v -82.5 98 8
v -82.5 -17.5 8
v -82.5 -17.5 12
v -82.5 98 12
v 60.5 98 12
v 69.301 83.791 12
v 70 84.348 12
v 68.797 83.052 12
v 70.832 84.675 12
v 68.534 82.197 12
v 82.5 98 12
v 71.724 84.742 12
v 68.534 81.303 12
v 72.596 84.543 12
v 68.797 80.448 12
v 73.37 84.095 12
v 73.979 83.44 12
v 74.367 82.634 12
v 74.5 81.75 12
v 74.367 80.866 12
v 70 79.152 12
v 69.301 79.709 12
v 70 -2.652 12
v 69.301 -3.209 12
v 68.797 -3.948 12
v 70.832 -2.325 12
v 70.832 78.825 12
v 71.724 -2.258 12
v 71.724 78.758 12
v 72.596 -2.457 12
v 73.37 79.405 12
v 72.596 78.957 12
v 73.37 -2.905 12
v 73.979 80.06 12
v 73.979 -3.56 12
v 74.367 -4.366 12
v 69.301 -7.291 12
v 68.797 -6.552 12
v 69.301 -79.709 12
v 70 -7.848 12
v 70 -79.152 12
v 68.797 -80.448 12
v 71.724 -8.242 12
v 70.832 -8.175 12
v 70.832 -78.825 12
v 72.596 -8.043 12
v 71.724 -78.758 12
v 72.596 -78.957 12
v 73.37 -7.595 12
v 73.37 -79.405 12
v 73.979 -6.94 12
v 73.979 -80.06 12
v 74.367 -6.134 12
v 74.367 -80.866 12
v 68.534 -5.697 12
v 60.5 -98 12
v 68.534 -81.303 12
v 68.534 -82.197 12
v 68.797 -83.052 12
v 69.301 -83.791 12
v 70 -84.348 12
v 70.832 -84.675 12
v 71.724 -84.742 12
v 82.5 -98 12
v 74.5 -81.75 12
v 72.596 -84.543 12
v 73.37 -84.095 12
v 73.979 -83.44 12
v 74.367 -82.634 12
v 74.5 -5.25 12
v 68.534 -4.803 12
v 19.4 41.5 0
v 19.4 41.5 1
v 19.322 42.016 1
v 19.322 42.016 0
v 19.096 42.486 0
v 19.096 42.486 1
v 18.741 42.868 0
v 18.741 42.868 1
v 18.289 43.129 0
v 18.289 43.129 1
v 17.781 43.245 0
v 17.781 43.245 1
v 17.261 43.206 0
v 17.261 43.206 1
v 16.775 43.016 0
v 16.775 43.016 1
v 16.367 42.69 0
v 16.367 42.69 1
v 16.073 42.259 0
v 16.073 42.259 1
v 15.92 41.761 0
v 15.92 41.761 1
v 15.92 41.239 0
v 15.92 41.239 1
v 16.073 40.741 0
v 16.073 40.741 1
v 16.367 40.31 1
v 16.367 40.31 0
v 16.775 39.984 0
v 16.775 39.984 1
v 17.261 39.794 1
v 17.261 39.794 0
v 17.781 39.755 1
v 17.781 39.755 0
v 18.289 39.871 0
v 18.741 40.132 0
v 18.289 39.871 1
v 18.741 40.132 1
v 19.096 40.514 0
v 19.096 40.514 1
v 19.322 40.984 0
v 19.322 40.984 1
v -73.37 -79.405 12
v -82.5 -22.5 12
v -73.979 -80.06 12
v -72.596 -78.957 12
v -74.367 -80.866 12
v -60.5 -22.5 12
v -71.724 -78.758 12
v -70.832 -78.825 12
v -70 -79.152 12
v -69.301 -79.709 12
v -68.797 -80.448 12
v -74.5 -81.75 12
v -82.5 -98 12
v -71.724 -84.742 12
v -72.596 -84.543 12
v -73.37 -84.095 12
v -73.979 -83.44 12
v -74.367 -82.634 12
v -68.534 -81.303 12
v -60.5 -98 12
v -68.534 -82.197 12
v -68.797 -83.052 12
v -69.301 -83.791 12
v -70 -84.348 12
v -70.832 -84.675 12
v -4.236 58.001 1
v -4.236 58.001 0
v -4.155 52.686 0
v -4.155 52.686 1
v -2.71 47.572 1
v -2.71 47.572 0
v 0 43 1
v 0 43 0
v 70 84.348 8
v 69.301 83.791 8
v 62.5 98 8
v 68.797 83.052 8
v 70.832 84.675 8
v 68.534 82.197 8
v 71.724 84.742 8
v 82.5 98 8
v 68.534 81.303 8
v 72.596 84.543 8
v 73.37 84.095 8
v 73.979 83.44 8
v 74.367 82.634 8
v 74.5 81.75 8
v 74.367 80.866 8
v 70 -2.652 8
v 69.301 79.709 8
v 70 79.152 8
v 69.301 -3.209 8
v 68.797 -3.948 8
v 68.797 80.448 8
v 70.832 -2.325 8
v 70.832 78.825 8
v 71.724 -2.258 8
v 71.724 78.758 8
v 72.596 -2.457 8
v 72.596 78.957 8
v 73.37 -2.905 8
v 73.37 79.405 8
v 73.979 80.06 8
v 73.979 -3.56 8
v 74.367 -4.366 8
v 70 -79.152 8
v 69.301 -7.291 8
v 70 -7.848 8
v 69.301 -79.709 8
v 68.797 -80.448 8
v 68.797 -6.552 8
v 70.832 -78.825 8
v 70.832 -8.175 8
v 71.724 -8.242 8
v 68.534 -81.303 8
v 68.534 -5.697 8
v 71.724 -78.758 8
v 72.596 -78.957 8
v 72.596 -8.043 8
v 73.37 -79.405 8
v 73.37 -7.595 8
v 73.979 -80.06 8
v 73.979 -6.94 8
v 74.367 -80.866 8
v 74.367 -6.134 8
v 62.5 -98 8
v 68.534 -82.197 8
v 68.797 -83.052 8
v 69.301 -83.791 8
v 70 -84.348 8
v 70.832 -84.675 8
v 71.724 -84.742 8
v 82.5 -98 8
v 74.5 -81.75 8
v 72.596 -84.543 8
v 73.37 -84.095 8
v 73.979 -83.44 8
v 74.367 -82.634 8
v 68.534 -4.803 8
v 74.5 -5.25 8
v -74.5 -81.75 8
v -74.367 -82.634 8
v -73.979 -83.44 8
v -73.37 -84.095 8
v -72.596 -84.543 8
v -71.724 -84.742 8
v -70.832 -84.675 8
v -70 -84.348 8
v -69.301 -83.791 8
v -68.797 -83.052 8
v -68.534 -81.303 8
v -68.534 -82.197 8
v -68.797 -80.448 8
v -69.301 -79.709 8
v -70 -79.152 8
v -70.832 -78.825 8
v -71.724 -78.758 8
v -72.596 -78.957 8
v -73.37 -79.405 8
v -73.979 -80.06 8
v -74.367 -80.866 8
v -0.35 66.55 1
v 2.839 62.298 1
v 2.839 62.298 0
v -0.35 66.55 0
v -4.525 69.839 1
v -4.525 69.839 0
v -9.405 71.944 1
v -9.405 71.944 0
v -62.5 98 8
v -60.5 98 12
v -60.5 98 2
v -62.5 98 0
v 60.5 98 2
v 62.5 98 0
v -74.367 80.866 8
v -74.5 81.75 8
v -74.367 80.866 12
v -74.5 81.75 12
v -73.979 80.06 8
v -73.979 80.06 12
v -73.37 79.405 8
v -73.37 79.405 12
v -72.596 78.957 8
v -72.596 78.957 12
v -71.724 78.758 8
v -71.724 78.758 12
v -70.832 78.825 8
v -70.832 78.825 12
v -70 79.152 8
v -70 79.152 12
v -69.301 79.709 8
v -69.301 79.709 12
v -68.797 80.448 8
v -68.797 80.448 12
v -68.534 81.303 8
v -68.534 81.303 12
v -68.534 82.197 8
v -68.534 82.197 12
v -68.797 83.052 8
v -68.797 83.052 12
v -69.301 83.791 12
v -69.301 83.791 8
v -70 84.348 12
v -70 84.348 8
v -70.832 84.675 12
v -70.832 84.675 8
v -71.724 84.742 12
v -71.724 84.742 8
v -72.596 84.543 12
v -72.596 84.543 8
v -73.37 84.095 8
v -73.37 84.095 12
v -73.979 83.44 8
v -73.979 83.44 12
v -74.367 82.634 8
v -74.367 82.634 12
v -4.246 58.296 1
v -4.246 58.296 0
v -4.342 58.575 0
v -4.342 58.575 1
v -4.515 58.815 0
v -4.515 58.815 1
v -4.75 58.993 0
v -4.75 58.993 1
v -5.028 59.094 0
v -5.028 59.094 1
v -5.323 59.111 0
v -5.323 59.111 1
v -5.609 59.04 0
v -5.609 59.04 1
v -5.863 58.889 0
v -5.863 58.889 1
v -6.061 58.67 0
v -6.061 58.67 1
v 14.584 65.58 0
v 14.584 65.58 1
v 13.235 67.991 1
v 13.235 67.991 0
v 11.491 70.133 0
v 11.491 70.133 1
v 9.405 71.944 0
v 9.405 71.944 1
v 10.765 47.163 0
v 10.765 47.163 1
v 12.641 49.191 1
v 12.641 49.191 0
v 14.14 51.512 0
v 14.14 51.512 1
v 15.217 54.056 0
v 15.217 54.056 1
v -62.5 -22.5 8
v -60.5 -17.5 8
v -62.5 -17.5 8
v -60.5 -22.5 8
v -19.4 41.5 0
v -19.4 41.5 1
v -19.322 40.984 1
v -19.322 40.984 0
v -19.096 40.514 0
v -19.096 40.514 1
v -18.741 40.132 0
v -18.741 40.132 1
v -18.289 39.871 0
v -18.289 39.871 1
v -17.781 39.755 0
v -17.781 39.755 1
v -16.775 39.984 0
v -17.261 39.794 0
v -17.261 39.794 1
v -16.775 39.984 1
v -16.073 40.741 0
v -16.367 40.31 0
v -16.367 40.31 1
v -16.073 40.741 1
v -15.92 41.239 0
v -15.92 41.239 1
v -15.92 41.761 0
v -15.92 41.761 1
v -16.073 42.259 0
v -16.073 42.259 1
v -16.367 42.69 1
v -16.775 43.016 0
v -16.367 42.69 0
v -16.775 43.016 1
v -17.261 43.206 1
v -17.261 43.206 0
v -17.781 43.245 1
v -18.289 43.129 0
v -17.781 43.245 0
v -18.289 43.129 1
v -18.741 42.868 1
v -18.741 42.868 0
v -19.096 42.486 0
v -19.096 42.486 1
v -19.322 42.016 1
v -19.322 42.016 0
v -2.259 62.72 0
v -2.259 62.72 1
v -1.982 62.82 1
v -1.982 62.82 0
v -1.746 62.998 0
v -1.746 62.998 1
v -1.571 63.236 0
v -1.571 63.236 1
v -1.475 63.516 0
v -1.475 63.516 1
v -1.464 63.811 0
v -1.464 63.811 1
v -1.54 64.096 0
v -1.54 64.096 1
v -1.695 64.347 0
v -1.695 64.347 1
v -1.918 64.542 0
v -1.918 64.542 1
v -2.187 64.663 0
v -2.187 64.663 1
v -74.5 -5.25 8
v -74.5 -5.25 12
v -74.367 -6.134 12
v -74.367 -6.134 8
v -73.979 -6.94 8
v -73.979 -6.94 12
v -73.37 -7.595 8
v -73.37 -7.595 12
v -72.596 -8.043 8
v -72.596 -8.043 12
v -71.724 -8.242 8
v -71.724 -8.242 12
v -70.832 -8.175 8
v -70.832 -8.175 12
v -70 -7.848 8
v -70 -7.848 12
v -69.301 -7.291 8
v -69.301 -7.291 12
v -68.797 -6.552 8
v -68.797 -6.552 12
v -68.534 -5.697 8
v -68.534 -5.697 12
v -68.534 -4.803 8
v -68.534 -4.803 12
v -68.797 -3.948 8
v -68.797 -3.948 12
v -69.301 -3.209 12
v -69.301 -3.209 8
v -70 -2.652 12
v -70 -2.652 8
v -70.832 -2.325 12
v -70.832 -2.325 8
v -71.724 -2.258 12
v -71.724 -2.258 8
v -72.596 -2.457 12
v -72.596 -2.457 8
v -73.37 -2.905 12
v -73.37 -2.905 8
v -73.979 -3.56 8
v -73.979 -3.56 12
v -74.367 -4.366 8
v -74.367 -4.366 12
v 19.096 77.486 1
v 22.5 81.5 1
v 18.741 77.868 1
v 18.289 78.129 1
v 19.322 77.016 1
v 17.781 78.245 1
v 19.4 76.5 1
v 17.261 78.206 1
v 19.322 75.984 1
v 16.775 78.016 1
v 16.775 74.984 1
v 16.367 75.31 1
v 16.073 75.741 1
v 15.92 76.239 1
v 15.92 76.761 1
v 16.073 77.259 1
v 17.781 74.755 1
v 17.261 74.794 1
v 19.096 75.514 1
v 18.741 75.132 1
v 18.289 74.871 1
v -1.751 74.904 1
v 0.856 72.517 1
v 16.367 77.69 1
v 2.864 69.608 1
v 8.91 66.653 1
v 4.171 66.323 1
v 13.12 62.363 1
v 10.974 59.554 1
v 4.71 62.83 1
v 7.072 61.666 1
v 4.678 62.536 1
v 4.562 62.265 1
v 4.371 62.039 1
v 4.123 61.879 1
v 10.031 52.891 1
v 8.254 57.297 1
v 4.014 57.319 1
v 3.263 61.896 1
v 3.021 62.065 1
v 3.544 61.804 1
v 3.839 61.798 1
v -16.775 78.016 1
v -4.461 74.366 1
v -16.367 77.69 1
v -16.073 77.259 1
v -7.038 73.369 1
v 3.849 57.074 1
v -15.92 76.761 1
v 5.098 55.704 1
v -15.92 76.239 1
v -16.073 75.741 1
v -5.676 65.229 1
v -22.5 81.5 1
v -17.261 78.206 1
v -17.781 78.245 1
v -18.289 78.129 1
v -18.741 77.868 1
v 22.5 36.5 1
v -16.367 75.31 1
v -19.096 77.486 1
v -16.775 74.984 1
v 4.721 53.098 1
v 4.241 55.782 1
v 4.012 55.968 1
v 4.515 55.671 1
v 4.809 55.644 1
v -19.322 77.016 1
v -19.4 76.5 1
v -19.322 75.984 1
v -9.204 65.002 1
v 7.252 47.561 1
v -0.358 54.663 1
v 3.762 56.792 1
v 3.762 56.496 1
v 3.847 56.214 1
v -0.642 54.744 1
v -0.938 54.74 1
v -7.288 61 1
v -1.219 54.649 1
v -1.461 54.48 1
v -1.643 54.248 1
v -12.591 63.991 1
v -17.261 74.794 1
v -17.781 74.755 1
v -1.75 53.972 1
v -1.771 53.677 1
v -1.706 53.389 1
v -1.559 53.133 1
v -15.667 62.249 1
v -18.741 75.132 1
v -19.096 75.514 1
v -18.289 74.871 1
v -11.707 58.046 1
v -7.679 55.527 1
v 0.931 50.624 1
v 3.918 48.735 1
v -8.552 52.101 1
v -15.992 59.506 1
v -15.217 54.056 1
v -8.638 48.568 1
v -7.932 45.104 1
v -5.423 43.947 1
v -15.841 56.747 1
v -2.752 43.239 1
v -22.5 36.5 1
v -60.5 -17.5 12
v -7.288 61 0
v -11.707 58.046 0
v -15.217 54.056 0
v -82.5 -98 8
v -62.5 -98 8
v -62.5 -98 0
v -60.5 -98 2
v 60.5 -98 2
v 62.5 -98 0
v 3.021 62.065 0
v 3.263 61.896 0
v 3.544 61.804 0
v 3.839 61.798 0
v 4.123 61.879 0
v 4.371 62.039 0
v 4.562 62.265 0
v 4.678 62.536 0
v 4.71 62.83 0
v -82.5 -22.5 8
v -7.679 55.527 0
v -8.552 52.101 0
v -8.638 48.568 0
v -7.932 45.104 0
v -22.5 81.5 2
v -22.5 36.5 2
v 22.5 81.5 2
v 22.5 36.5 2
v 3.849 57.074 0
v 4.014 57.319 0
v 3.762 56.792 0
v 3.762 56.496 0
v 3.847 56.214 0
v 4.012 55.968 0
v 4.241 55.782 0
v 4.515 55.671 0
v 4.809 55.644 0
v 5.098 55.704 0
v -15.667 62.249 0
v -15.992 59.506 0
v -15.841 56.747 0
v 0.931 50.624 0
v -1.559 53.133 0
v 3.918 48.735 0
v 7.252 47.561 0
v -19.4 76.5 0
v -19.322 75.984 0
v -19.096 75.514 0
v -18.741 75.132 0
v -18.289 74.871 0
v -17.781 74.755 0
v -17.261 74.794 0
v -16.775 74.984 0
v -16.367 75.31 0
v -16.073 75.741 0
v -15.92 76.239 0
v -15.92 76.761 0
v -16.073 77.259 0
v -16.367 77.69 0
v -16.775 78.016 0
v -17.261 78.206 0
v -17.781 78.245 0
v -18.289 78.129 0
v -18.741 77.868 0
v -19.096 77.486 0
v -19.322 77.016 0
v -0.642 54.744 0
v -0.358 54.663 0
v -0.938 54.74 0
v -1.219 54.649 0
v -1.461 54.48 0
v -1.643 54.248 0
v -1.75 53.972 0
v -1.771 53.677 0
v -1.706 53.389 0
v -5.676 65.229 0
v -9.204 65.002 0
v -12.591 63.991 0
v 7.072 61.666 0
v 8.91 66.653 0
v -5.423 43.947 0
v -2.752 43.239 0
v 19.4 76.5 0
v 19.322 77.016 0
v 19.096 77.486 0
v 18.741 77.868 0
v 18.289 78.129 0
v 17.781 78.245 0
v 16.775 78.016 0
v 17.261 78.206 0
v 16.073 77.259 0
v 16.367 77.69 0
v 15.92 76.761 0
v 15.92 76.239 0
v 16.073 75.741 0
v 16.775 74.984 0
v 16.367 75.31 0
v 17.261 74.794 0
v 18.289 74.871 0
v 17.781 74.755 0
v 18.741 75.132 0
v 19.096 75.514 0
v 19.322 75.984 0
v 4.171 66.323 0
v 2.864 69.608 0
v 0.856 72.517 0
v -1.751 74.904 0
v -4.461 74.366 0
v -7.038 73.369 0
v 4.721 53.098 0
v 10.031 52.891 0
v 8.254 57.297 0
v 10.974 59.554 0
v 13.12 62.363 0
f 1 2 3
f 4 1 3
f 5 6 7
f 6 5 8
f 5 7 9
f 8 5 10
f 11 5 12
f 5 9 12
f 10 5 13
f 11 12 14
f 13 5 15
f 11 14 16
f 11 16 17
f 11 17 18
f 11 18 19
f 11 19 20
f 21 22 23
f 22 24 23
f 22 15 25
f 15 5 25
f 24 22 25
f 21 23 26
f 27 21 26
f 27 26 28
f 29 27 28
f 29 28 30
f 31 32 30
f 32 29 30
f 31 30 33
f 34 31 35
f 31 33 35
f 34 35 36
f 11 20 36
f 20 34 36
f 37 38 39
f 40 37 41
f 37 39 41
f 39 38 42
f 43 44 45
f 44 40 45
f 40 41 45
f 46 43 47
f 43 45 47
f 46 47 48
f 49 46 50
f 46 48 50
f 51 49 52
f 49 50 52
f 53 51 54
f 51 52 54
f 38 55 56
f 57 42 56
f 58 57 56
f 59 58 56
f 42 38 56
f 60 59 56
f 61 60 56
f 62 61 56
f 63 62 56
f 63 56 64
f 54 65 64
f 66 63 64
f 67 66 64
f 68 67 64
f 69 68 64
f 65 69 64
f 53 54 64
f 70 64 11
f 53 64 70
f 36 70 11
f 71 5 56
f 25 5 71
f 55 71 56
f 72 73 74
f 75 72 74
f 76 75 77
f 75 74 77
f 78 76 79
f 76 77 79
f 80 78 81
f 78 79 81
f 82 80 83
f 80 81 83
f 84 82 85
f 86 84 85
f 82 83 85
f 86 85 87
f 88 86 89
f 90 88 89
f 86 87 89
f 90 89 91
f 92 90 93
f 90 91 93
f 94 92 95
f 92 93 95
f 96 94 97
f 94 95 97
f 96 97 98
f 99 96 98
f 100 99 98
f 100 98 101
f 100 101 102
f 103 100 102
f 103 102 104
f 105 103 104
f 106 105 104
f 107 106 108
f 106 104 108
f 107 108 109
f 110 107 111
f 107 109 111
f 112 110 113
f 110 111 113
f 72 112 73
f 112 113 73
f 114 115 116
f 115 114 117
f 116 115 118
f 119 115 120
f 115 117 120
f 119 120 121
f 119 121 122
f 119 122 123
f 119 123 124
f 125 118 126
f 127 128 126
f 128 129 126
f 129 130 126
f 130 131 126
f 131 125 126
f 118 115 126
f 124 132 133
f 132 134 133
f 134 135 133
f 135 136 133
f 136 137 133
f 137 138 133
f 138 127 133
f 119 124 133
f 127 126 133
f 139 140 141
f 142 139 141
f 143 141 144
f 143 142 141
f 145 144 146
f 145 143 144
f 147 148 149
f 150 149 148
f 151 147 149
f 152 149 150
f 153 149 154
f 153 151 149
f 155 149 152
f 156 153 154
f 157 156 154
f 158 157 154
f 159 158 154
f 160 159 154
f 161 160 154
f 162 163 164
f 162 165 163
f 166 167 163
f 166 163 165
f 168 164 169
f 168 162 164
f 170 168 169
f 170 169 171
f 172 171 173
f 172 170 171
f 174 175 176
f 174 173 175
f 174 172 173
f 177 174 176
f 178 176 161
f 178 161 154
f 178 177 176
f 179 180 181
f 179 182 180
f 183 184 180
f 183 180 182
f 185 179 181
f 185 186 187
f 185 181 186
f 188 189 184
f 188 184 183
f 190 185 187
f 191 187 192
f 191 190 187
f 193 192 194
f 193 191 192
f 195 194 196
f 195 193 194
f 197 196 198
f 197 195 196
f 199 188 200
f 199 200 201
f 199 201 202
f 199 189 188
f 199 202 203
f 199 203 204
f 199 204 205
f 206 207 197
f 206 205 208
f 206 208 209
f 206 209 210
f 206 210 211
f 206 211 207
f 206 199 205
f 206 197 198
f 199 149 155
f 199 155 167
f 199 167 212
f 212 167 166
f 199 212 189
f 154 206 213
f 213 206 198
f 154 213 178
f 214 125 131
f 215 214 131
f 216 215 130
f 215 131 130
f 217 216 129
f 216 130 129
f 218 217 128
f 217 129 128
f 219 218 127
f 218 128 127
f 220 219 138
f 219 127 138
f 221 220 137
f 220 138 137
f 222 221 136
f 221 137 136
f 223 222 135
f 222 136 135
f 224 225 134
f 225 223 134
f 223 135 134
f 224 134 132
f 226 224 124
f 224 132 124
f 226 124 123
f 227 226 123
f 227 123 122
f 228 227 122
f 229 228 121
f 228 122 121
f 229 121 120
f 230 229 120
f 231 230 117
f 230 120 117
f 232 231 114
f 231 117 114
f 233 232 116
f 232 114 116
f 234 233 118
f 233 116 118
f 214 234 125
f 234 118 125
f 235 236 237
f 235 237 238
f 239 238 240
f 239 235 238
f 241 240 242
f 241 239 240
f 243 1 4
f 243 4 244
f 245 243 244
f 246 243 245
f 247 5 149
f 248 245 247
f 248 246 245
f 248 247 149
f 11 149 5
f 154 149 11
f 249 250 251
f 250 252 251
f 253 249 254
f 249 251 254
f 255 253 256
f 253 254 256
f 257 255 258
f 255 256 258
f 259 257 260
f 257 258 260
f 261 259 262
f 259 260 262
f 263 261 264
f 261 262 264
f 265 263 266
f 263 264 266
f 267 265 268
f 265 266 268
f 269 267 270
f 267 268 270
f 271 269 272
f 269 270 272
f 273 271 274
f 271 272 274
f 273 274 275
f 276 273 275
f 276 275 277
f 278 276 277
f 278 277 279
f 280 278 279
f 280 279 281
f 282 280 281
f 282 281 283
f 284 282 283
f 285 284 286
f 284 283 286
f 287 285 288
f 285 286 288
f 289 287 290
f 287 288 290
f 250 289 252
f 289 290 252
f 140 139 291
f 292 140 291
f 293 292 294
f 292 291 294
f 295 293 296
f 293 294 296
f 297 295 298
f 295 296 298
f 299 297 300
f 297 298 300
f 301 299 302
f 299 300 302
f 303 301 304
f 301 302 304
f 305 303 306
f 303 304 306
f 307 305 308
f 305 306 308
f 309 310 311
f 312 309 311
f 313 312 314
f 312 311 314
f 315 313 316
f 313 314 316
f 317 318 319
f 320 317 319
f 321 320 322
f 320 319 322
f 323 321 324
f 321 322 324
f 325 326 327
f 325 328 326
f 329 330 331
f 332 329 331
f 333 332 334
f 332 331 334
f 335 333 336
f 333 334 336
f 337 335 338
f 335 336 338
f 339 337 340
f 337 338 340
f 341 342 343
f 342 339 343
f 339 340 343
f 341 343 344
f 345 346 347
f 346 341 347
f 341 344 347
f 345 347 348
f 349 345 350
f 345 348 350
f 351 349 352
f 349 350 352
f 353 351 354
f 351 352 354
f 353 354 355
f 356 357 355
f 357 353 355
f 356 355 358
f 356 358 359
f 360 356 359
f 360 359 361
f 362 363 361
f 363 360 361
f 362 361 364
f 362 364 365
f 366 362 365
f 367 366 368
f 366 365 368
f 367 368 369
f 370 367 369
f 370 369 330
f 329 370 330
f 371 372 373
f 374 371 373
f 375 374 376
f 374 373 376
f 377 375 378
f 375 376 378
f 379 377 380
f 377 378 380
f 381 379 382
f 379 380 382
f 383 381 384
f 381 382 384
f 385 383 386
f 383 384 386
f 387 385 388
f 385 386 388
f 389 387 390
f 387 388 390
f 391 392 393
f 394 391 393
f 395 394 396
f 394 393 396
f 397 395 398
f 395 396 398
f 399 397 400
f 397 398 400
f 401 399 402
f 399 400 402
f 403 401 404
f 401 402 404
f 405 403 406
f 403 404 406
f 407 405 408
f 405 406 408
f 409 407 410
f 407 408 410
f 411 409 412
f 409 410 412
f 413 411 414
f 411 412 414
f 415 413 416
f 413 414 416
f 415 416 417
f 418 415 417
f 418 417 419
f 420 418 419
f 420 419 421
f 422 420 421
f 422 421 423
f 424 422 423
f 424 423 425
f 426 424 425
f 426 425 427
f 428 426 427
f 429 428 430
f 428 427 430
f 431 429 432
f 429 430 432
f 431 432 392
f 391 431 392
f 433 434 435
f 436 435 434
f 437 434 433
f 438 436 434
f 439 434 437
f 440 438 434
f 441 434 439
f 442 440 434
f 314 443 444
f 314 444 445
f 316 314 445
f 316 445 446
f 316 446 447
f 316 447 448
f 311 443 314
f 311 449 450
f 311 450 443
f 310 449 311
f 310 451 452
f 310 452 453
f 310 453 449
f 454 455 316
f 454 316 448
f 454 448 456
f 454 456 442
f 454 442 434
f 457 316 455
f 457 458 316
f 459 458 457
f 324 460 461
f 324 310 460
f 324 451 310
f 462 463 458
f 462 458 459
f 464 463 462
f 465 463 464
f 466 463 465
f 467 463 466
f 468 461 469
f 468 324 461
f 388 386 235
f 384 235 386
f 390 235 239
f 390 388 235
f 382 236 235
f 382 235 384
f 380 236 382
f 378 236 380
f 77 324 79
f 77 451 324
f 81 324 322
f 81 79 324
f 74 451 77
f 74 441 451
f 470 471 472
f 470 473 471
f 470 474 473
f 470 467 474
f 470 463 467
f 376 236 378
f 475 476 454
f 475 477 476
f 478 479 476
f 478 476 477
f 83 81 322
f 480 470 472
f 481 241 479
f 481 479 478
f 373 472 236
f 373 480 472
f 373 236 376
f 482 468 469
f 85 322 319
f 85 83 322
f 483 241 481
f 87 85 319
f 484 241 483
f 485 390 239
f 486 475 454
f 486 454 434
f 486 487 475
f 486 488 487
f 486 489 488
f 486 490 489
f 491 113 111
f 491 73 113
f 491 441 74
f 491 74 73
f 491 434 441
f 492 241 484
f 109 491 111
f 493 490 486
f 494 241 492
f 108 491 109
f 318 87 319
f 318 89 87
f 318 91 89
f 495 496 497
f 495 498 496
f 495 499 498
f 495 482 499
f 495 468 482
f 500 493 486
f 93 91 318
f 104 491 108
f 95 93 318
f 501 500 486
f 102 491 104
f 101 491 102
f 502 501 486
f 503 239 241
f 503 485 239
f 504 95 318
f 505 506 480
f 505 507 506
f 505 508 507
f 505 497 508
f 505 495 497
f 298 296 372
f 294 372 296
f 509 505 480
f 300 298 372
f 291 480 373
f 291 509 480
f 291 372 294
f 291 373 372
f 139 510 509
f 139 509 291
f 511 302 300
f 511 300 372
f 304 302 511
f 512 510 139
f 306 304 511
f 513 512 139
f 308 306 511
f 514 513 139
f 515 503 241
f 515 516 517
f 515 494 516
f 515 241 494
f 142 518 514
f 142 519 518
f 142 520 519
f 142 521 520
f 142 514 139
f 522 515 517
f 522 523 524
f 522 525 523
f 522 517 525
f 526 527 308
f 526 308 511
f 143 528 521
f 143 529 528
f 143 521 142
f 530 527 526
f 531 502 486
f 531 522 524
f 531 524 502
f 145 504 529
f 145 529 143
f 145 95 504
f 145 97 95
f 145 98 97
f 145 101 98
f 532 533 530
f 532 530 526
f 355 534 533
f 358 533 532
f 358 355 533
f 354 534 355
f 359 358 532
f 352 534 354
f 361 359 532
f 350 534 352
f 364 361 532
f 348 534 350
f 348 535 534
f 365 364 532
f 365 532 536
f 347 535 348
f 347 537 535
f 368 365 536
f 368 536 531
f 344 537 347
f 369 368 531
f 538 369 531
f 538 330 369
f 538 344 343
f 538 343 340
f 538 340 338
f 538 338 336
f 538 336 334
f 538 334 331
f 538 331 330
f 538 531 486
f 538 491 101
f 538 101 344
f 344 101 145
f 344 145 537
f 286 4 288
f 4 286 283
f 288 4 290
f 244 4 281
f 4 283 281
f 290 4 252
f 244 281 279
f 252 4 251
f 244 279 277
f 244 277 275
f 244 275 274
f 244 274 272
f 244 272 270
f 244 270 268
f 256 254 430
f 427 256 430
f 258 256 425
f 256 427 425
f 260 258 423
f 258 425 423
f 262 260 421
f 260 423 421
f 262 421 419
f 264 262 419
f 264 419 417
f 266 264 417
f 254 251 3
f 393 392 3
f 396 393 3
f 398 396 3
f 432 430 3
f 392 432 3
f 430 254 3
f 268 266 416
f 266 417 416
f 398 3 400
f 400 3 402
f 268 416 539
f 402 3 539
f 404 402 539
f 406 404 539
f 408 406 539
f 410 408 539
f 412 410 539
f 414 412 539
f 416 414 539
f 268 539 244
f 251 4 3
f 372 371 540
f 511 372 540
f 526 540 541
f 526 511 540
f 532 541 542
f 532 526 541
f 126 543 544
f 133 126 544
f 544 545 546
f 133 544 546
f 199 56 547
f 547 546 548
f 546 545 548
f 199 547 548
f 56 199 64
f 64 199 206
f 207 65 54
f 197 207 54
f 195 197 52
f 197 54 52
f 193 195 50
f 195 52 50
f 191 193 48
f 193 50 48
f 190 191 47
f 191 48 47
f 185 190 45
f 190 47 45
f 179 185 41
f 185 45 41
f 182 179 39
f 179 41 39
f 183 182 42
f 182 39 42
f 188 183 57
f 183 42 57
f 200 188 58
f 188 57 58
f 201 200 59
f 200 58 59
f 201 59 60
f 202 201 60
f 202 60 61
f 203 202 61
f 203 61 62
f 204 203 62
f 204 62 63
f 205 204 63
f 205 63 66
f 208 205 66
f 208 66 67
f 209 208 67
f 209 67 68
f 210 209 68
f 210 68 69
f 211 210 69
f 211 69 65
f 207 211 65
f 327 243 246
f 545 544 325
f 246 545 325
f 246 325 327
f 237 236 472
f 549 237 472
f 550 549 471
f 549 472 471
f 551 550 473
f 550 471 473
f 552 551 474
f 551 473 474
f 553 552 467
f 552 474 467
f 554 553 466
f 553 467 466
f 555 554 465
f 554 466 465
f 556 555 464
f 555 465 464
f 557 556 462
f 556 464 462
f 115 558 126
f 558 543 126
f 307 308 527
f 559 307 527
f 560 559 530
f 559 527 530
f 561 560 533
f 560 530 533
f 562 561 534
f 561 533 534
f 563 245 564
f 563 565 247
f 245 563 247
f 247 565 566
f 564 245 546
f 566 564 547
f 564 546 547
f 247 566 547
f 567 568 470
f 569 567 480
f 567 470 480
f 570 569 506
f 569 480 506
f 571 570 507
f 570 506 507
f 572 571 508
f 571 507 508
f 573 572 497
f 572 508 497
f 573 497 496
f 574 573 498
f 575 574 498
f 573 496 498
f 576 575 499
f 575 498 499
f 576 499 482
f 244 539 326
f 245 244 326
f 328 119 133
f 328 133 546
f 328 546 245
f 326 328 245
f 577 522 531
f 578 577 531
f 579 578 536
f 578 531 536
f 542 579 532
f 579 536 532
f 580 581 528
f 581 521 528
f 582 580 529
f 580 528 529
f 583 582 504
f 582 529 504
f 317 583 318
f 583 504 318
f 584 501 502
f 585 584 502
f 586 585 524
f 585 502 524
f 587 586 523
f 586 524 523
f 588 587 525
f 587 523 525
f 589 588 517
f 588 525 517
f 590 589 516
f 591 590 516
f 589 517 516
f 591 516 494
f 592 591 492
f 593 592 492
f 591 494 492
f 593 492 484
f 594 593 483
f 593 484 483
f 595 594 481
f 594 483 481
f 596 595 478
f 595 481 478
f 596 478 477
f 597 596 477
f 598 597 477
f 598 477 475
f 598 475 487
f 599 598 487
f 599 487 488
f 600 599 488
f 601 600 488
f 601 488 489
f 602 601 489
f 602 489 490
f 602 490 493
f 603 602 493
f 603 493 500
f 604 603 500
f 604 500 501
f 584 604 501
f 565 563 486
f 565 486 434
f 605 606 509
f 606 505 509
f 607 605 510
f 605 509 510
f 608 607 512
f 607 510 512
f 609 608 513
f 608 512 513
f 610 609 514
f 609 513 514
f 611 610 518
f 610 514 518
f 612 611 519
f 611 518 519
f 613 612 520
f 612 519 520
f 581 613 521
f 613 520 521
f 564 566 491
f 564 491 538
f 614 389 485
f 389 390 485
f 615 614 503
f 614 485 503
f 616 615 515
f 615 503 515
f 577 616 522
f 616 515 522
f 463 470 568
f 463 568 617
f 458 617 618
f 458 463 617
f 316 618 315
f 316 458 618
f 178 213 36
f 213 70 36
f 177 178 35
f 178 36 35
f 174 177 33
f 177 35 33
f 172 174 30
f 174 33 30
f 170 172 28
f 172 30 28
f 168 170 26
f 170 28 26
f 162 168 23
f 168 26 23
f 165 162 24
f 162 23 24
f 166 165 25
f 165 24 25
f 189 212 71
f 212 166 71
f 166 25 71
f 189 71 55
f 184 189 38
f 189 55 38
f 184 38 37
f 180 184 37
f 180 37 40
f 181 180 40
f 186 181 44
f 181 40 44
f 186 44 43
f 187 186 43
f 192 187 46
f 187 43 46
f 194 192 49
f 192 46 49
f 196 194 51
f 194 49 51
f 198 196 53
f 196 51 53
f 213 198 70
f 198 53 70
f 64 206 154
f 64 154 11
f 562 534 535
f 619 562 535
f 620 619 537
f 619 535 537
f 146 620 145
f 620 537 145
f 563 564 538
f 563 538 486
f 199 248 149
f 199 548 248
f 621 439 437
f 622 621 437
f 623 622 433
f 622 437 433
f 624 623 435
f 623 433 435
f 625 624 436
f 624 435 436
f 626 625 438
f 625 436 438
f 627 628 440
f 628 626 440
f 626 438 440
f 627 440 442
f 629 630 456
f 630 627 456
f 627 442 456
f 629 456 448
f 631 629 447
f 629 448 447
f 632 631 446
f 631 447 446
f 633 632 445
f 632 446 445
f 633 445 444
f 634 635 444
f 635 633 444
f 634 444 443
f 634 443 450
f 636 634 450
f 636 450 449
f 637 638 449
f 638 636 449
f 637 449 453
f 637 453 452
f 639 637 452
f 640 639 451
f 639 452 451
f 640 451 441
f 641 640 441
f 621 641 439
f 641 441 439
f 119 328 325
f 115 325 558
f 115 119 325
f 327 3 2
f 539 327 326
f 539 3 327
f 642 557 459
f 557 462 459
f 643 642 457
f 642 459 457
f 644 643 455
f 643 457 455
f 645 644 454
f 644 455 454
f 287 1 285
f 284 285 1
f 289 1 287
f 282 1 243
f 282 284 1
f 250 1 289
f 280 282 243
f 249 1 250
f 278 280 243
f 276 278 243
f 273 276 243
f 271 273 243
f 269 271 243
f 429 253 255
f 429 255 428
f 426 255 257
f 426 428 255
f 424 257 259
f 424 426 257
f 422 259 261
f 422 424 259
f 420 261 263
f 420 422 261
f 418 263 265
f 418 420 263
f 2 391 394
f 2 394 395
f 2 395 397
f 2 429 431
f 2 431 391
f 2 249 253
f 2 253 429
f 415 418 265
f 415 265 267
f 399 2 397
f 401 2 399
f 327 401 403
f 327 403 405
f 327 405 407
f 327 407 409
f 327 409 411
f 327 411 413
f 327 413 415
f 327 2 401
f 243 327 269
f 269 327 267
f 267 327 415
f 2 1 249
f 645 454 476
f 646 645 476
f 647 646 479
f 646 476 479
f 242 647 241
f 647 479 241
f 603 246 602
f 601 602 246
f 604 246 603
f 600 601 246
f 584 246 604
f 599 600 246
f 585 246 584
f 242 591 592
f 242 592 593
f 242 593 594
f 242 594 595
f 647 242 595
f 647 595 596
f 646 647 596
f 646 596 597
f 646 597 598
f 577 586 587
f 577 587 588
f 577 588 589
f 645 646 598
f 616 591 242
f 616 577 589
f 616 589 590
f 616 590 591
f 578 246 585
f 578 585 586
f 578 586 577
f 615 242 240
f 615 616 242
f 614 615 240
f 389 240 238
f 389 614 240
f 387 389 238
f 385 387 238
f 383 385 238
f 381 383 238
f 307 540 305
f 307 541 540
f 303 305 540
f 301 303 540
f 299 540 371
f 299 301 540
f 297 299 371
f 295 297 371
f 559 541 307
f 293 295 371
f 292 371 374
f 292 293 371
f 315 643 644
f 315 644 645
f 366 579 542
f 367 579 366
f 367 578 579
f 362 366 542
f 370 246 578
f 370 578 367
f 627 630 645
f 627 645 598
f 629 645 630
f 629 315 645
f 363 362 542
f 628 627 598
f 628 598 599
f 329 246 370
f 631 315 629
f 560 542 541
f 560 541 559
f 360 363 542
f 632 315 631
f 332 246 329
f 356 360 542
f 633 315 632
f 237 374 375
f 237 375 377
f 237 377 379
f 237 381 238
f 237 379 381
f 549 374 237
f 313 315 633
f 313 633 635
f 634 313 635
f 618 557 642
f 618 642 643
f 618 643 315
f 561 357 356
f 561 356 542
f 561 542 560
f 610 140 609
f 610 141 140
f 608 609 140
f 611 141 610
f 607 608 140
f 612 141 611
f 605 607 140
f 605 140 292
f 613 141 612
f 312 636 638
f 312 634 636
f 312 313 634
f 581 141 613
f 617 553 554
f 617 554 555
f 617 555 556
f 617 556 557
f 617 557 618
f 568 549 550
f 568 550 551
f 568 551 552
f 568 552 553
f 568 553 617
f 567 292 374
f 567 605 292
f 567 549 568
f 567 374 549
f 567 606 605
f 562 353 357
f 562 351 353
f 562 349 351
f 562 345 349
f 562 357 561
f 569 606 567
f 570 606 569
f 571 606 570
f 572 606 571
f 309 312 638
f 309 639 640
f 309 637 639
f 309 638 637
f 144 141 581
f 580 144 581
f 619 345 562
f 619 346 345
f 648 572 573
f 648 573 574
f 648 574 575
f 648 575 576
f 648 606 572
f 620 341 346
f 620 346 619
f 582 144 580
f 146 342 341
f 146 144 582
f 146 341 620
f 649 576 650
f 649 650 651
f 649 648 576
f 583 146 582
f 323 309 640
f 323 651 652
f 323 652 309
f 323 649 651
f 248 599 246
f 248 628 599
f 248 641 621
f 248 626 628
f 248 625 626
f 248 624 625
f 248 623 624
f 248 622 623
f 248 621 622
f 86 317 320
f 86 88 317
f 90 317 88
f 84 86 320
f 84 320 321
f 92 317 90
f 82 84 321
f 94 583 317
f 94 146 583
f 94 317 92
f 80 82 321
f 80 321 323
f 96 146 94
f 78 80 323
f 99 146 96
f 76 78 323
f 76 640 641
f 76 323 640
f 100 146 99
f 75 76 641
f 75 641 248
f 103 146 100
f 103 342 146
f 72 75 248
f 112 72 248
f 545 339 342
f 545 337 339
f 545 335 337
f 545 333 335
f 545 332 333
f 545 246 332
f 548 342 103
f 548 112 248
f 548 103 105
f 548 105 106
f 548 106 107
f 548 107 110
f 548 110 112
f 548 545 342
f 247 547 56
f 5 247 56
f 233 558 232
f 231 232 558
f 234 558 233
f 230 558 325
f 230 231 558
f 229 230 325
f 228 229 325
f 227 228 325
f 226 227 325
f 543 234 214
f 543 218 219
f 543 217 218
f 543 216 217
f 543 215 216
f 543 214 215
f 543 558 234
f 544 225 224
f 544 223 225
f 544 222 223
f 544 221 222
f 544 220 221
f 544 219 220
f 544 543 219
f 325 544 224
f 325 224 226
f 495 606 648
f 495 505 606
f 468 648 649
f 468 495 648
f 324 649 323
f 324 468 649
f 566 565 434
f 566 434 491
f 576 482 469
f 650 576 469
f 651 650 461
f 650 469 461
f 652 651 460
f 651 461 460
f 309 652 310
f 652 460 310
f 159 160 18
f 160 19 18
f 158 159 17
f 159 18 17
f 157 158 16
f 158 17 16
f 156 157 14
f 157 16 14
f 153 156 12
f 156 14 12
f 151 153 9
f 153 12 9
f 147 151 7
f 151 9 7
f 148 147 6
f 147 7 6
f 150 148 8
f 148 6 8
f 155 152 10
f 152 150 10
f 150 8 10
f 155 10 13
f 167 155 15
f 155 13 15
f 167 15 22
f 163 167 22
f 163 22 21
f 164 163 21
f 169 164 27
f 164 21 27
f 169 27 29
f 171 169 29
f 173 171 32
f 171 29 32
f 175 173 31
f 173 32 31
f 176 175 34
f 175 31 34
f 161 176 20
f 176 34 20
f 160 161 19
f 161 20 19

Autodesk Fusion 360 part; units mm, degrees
sketch "extrusion" plane through (0, 0, 0) normal (0, 1, 0) x (1, 0, 0)
  line L0 (-82.5, -8) -> (-62.5, -8)
  line L1 (-62.5, -8) -> (-62.5, 0)
  line L2 (-62.5, 0) -> (62.5, 0)
  line L3 (62.5, 0) -> (62.5, -8)
  line L4 (62.5, -8) -> (82.5, -8)
  line L5 (-60.5, -12) -> (-60.5, -2)
  line L6 (-60.5, -2) -> (60.5, -2)
  line L7 (60.5, -2) -> (60.5, -12)
  line L8 (-82.5, -12) -> (-60.5, -12)
  line L9 (60.5, -12) -> (82.5, -12)
  line L10 (-82.5, -8) -> (-82.5, -12)
  line L11 (82.5, -8) -> (82.5, -12)
  dimension "d1" = 125
  dimension "d2" = 8
  dimension "d3" = 20
  dimension "d4" = 8
  dimension "d5" = 20
extrude "Extrude1" add sketch "extrusion" along normal mid plane 196
sketch "top holes" plane through (0, 0, 12) normal (0, 0, 1) x (-1, 0, 0)
  circle A0 centre (71.5, -81.75) radius 3
  line L0 (82.5, -98) -> (60.5, -98)
  dimension "d11" = 6
  dimension "d12" = 16.25
extrude "Extrude2" cut sketch "top holes" against normal blind 4
mirror "Mirror1" about plane through (0, 0, 0) normal (1, 0, 0) of "Extrude2"
mirror "Mirror2" about plane through (0, 0, 0) normal (0, 1, 0) of "Extrude2", "Mirror1"
sketch "square undent" plane through (0, 0, 2) normal (0, 0, 1) x (-1, 0, 0)
  line L0 (22.5, -81.5) -> (-22.5, -81.5)
  line L1 (-22.5, -81.5) -> (-22.5, -36.5)
  line L2 (-22.5, -36.5) -> (22.5, -36.5)
  line L3 (22.5, -36.5) -> (22.5, -81.5)
  line L4 (60.5, -98) -> (-60.5, -98)
  dimension "d17" = 45
  dimension "d18" = 45
  dimension "d19" = 16.5
extrude "Extrude3" cut sketch "square undent" against normal blind 1
sketch "square holes" plane through (0, 0, 1) normal (0, 0, 1) x (-1, 0, 0)
  circle A0 centre (17.65, -76.5) radius 1.75
  line L0 (22.5, -81.5) -> (-22.5, -81.5)
  line L1 (22.5, -36.5) -> (22.5, -81.5)
  line L2 (-22.5, -36.5) -> (22.5, -81.5) construction
  circle A1 centre (0, -59) radius 16
  arc A2 (4.2359, -58.0006) -> (0, -43) centre (-16.1329, -55.654) ccw
  arc A3 (6.0614, -58.6697) -> (7.9315, -45.1043) centre (-7.0111, -49.9559) ccw
  arc A4 (4.2359, -58.0006) -> (6.0614, -58.6697) centre (5.2293, -58.115) ccw
  dimension "d22" = 3.5
  dimension "d23" = 5
  dimension "d24" = 4.85
  dimension "d25" = 32
  dimension "d26" = 1
  dimension "d35" = 5.2293
  dimension "d36" = 7.9315
  dimension "d37" = 15.7105
  dimension "d38" = 20.5035
  dimension "d39" = 0.885
extrude "Extrude4" cut sketch "square holes" against normal blind 1 contours A0
ref_plane "WorkPlane1" through (0, 59, 1.5) normal (0, -1, 0) x (-1, 0, 0)
mirror "Mirror3" about plane through (0, 59, 1.5) normal (0, -1, 0) of "Extrude4"
mirror "Mirror4" about plane through (0, 0, 0) normal (1, 0, 0) of "Extrude4", "Mirror3"
extrude "Extrude5" cut sketch "square holes" against normal blind 1 contours A1 A2 A3 A4 picked at (5.7365, -46.2771)
pattern_circular "C-Pattern1" count 5 over 360 about axis through (0, 59, 1) along (0, 0, -1) of "Extrude5"
sketch "midhole" plane through (0, 0, 12) normal (0, 0, 1) x (-1, 0, 0)
  circle A0 centre (71.5, 5.25) radius 3
  circle A1 centre (71.5, -81.75) radius 3
  dimension "d40" = 81
extrude "Extrude6" cut sketch "midhole" against normal blind 4 contours A0
mirror "Mirror5" about plane through (0, 0, 0) normal (1, 0, 0) of "Extrude6"
sketch "Sketch6" plane through (0, 0, 12) normal (0, 0, 1) x (-1, 0, 0)
  line L0 (60.5, 22.5) -> (82.5, 22.5)
  line L1 (82.5, 22.5) -> (82.5, 17.5)
  line L2 (82.5, 17.5) -> (60.5, 17.5)
  line L3 (60.5, 17.5) -> (60.5, 22.5)
  line L4 (60.5, 98) -> (60.5, -98)
  line L5 (82.5, 98) -> (82.5, -98)
  line L6 (60.5, 98) -> (82.5, 98)
  dimension "d44" = 5
  dimension "d45" = 75.5
extrude "Extrude7" cut sketch "Sketch6" against normal blind 4 contours L0 L1 L2 L3 L4 L5
